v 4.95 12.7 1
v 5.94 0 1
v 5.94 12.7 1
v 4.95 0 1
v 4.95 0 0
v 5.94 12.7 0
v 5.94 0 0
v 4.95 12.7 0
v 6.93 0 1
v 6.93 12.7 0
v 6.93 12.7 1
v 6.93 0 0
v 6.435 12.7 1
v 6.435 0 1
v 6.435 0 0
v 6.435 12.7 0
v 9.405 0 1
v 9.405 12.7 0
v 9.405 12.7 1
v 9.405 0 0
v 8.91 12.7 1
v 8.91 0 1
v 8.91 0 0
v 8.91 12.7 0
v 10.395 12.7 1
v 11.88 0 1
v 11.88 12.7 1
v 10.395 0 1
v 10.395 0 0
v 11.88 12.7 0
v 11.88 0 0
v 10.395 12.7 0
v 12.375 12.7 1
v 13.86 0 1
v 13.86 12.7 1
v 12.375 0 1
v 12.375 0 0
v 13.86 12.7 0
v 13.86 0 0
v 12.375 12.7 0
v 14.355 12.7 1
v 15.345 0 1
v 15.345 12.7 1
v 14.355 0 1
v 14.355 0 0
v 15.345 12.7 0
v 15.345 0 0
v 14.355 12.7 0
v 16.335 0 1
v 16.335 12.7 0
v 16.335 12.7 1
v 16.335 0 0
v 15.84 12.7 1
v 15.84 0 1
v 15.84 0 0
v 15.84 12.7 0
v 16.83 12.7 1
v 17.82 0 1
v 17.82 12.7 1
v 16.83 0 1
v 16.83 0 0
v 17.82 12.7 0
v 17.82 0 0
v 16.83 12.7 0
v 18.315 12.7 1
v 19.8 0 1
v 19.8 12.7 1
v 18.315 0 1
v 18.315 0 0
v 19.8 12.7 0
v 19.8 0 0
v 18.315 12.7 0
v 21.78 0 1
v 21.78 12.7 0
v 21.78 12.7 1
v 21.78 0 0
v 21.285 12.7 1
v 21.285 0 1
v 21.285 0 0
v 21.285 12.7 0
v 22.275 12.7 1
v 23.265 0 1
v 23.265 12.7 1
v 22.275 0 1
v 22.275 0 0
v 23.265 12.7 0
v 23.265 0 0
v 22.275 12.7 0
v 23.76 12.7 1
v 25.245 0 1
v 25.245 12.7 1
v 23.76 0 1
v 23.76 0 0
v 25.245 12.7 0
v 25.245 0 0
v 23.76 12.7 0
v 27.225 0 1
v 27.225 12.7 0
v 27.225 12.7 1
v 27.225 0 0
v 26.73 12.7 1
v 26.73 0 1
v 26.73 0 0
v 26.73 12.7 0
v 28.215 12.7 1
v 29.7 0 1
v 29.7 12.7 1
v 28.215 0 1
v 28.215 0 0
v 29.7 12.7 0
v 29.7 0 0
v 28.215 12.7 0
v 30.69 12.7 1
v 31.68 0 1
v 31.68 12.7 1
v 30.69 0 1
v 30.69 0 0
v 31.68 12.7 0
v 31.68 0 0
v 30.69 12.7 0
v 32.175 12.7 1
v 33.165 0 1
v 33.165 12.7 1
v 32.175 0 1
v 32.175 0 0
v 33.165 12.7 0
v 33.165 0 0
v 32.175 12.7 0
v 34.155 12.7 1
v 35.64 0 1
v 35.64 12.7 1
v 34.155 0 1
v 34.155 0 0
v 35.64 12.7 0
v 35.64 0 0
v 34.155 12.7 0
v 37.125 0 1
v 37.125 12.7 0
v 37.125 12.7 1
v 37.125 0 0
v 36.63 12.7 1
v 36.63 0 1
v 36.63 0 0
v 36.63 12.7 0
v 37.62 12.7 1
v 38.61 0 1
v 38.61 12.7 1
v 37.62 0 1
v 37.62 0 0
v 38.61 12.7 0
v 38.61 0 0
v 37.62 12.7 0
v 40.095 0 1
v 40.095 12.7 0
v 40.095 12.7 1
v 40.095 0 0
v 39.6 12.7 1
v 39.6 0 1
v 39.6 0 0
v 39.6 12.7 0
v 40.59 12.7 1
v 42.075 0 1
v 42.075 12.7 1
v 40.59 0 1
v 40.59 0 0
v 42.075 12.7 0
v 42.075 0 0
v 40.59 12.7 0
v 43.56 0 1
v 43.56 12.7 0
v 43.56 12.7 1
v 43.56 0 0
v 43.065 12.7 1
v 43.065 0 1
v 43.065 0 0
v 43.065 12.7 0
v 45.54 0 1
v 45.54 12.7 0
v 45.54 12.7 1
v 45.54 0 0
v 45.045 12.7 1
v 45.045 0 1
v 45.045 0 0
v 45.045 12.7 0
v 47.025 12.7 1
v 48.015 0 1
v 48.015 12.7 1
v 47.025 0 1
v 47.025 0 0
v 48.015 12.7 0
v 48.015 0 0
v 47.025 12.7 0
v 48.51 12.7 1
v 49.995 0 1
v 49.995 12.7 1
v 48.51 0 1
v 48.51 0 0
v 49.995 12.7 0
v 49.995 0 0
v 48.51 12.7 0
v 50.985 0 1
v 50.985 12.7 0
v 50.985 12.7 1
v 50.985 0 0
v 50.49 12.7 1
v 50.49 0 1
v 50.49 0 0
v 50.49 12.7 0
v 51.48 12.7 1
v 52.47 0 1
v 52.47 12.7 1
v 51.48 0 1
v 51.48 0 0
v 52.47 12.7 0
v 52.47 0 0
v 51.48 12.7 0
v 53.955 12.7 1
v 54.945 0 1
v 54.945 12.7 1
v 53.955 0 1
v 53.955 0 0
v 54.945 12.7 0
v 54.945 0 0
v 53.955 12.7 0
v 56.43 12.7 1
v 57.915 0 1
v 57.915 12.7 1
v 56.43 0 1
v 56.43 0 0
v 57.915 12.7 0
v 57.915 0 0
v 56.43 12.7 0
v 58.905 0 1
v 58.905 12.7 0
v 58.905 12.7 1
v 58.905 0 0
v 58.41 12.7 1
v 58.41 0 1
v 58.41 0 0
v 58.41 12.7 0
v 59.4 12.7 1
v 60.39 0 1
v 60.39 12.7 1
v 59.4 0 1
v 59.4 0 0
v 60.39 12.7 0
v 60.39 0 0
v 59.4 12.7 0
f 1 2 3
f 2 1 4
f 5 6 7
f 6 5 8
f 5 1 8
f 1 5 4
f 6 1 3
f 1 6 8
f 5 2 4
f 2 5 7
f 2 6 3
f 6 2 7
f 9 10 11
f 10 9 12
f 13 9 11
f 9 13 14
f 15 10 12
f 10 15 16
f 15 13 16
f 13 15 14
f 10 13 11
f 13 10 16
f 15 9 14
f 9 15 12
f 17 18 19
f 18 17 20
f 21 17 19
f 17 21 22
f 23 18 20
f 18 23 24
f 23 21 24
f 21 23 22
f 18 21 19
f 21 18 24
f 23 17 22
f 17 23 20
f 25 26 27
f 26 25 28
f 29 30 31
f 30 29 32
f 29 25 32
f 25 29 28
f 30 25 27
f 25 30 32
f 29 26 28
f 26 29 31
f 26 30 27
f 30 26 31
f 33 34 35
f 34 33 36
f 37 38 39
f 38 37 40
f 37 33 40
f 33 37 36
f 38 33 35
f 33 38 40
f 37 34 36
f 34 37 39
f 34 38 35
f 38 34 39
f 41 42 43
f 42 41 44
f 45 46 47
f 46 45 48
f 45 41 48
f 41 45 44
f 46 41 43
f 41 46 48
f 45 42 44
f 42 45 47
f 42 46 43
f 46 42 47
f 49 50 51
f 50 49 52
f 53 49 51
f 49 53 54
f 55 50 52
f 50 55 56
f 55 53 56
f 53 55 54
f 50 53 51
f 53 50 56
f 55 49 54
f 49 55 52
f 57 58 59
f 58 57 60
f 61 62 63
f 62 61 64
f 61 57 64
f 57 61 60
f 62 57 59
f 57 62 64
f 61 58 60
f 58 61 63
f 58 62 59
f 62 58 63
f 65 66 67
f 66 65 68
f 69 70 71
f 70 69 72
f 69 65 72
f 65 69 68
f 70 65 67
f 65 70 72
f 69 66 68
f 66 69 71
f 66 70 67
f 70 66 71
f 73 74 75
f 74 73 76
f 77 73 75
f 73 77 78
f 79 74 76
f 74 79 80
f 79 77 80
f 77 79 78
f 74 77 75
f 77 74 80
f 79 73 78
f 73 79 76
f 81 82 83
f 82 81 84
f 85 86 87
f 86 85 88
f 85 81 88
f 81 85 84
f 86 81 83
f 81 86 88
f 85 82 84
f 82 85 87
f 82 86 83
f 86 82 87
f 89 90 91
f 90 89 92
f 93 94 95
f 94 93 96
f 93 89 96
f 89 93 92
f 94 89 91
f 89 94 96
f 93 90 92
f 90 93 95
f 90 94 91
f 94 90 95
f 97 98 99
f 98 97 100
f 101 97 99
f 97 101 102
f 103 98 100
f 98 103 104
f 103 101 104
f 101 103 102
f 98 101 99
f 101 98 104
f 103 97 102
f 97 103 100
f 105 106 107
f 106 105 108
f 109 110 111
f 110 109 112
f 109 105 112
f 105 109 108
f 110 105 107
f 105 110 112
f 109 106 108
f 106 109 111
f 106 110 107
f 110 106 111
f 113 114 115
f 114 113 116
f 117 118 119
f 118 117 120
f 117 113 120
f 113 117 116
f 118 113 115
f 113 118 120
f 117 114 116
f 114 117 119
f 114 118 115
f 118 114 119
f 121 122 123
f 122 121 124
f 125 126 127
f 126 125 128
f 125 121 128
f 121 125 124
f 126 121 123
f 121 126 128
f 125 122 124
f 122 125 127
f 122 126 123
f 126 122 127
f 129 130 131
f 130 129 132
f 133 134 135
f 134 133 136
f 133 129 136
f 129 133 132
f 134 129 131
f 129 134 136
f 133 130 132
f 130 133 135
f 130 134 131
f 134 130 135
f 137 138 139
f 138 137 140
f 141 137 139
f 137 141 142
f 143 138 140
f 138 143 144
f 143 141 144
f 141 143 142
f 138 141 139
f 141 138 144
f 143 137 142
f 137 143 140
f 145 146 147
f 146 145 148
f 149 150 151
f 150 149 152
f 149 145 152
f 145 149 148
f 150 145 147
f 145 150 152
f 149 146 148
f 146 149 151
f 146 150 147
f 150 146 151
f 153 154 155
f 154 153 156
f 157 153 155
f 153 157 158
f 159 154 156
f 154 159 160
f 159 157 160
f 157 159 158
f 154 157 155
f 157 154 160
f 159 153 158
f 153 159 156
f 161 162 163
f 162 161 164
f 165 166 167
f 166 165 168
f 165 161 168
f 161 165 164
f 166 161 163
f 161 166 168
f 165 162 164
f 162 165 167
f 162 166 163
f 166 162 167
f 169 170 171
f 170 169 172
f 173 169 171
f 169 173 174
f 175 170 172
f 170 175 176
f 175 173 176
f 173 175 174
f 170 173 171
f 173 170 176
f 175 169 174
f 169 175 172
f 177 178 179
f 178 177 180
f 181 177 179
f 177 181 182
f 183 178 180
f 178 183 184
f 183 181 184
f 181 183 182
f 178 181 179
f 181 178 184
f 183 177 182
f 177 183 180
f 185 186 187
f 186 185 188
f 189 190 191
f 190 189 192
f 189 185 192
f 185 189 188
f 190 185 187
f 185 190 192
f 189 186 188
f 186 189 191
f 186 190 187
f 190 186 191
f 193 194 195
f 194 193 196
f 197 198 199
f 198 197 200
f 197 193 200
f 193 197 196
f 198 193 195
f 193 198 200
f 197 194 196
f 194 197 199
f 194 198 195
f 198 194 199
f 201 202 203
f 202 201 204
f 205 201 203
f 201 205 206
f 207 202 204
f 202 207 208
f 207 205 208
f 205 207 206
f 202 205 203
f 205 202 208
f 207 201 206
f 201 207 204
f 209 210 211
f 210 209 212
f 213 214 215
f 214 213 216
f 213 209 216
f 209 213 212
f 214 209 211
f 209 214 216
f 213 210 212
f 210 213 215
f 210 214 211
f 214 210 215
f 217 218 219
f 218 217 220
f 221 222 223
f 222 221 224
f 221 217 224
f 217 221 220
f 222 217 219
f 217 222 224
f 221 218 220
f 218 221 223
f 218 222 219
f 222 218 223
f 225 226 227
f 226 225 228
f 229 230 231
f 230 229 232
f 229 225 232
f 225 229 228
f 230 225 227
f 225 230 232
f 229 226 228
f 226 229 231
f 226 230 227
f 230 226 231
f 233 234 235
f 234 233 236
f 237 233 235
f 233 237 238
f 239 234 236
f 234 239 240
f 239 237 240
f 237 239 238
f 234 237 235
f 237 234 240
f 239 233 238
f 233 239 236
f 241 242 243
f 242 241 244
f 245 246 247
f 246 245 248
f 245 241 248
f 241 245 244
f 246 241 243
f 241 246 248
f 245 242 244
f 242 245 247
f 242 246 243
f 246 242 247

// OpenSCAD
// file: ../../util/bitmap.scad
/*****************************************************************************
 * Module Bitmap Library
 * Modules to create bitmaps of unit squares from 1 or 2 dimensional vectors.
 *****************************************************************************
 * Copyright 2017 Chris Baker
 *
 * This program is free software: you can redistribute it and/or modify
 * it under the terms of the GNU Lesser General Public License as published by
 * the Free Software Foundation, either version 3 of the License, or
 * (at your option) any later version.
 *
 * This program is distributed in the hope that it will be useful,
 * but WITHOUT ANY WARRANTY; without even the implied warranty of
 * MERCHANTABILITY or FITNESS FOR A PARTICULAR PURPOSE.  See the
 * GNU Lesser General Public License for more details.
 *
 * You should have received a copy of the GNU Lesser General Public License
 * along with this program.  If not, see <http://www.gnu.org/licenses/>.
 *****************************************************************************
 * Usage:
 * Include this file with the "use" tag.
 * Depends on compat.scad library.
 *
 * API:
 *   1dbitmap(bitmap, center, expansion, vector_mode)
 *   2dbitmap(bitmap, center, expansion, vector_mode)
 *     Generate a 1 or 2-Dimensional field of modules based on the provided
 *     bitmap vector. See Bitmap Vectors below.
 *     The center flag determines whether to center the bitmap on the origin.
 *     The expansion value actually shrinks each cube in the x and y
 *     dimension by the specified amount.
 *     The vector_mode flag determines whether to create 3D solid geometry
 *     (unit cubes) or 2D vector geometry (squares).
 *
 * Bitmap Vectors:
 *   The bitmap vectors primarily provide boolean information.
 *   A module will be placed where these vectors have a postive value and
 *   skipped where they have a negative value. I.E. 0, -1, false, and undef
 *   are all equivalent and result in a skip. 1 and true are equivalent and
 *   result in a placed 1-unit module.
 *   Further, if the value is an integer it will be treated as a height for
 *   the module, allowing z-maps to be created.
 *   If the value is not an integer or boolean, it will be treated as a color
 *   reference. This can be a string or RGBA vector that will be used to
 *   color the module in the OpenSCAD preview window.
 *   In current versions of OpenSCAD, the color has no effect in the rendered
 *   view or STL output.
 *
 * Vector Mode:
 *   Although OpenSCAD supports generating 2D geometry, there are several
 *   caveats:
 *   - 2D and 3D geometry cannot be mixed
 *   - Extruding 2D geometry causes color information to be lost
 *   - All 2D geometry is projected onto the XY plane when rendering
 *   - Rendering also results in loss of color (same as 3D)
 *   - The SVG exporter is somewhat limited:
 *     - The pixel size of the image is hard-coded in the file
 *     - The title of the image is a generic string
 *     - The color selection for stroke and fill is fixed
 *     - The stroke-width is set to a large value that will cause overlap
 *     - The background is transparent
 *     - Only one path element is created with all of the geometry; there is
 *       no easy way to split up the geometry into multiple logical units.
 *     - These issues can mostly be resolved by hand-editing the file:
 *       - Remove or modify the width and height parameters from the svg
 *         element at the top of the file to provide better scaling.
 *       - Edit the title element at the top of the file to change the title.
 *       - Edit the stroke and fill parameters of the path element (these will
 *         probably be at the end of the file).
 *       - Set the stroke-width parameter for the path element to 0.
 *****************************************************************************/
use <compat.scad>

/*
 * 2dbitmap - Turn a 2D vector into a bitmap of cubes
 *
 * bitmap - 2D vector representing where to place each cube
 *          Value can either be boolean, z-height, or color
 * center - center cubes around the origin
 * expansion - size of gap around each pixel (screendoor)
 * vector_mode - create a 2D vector drawing instead of 3D extrusion
 */
module 2dbitmap(bitmap=[[1,0],[0,1]], center=false, expansion=0, vector_mode=false)
{
	ylen=len(bitmap)-1;

	for (y=[0:ylen]) {
		xlen=len(bitmap[y])-1;
		for (x=[0:xlen])
			translate([x-(center?xlen/2:0),ylen-y-(center?ylen/2:0),0])
				if (is_indexable(bitmap[y][x]))
					color(bitmap[y][x])
						if (vector_mode)
							square([1-expansion,1-expansion], center=center);
						else
							cube([1-expansion,1-expansion,1], center=center);
				else
					if (bitmap[y][x])
						if (vector_mode)
							square([1-expansion,1-expansion], center=center);
						else
							cube([1-expansion,1-expansion,clamp_nonnum(bitmap[y][x])], center=center);
	}
}

module 1dbitmap(bitmap=[1,0,1,0,1], center=false, expansion=0, vector_mode=false)
	2dbitmap([bitmap], center, expansion, vector_mode);

/*
 * Examples
 */

// 1D with z-height
translate([10,0,0]) scale([1,10,1])
	1dbitmap(bitmap=[1,1,0,2,0,0,3], expansion=.1);

// 1D with boolean
translate([-20,0,0]) scale([1,10,1])
	1dbitmap(bitmap=[true,false,true,false,true,true]);

// 2D with z-height
scale([2,2,1])
	2dbitmap(bitmap=[[1,0,2,1],[0,3,3,0],[1,1,0,1]],
		center=true);

// 1D with color
translate([0,-10,0]) scale([1,3,1])
	1dbitmap(bitmap=["red","white","blue",[0,0.3,0,0.5]]);

// 1D with color using 2D-vector-mode
translate([-7,-8,0]) scale([1,2])
	1dbitmap(bitmap=["red",0,"blue",0,"green"], vector_mode=true);
translate([-4.5,-10,0]) scale([1,2])
	1dbitmap(bitmap=["red",0,"blue",0,"green"], vector_mode=true, center=true);
// main file
/* Unit Test 11: Expert mode */
use <../code128.scad>

code_128([QUIET(),START_A(),48,42,42,17,18,19,35,54,STOP(),QUIET()],
		bar="black", expert_mode=true);
